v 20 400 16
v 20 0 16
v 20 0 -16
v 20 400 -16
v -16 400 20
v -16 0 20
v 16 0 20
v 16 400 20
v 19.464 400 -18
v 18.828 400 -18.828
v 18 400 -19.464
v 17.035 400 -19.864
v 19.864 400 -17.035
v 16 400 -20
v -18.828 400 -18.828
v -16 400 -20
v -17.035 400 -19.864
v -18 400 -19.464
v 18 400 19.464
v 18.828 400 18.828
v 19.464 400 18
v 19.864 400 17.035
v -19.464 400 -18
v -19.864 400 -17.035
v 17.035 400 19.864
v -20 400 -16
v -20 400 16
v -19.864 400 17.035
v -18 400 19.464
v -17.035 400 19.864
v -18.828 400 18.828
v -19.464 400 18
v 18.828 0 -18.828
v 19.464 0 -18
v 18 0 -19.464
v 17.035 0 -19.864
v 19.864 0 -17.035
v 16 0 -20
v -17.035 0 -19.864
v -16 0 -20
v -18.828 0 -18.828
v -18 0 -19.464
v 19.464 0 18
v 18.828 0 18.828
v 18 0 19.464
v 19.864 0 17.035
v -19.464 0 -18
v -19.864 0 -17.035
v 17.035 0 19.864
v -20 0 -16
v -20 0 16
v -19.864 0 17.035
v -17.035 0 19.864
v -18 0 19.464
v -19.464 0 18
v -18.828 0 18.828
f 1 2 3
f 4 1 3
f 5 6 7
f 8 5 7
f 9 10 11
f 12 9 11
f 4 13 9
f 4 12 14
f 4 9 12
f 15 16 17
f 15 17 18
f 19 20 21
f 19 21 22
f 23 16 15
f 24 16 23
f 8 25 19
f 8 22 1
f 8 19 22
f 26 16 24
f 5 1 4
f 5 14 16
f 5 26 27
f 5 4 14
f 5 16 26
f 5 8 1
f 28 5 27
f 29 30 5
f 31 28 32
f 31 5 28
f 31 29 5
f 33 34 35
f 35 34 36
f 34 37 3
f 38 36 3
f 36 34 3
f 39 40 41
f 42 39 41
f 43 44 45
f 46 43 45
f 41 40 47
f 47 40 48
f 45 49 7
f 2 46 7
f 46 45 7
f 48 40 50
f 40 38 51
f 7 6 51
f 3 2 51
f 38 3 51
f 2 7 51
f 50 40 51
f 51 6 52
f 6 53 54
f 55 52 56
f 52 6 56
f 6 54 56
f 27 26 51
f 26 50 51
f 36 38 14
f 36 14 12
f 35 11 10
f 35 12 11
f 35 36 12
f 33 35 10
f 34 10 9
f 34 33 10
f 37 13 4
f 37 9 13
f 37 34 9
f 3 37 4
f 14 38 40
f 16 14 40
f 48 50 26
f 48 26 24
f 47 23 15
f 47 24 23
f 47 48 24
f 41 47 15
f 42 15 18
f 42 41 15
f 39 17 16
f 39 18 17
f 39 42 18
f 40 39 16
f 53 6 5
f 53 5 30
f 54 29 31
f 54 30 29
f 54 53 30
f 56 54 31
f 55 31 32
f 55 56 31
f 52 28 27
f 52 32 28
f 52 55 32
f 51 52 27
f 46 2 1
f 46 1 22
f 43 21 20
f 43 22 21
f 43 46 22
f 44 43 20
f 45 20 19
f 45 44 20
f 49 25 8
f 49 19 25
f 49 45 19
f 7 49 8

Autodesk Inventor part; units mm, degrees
ref_plane "YZ Plane" through (0, 0, 0) normal (1, 0, 0) x (0, 1, 0)
ref_plane "XZ Plane" through (0, 0, 0) normal (0, 1, 0) x (-1, 0, 0)
ref_plane "XY Plane" through (0, 0, 0) normal (0, 0, 1) x (1, 0, 0)
sketch "Sketch1" plane through (0, 0, 0) normal (0, 1, 0) x (-1, 0, 0)
  line L0 (0, 12.4728) -> (0, -12.4728) construction
  line L1 (2.135, 0) -> (-2.135, 0) construction
  line L2 (16, 20) -> (-16, 20)
  line L3 (-20, 16) -> (-20, -16)
  line L4 (-16, -20) -> (16, -20)
  line L5 (20, -16) -> (20, 16)
  arc A0 (-16, 20) -> (-20, 16) centre (-16, 16) ccw
  arc A1 (-20, -16) -> (-16, -20) centre (-16, -16) ccw
  arc A2 (16, -20) -> (20, -16) centre (16, -16) ccw
  arc A3 (20, 16) -> (16, 20) centre (16, 16) ccw
  point P0 (0, 0)
  point P1 (0, 0)
  dimension "d1" = 4
  dimension "d2" = 4
  dimension "d3" = 40
extrude "Extrusion1" add sketch "Sketch1" along normal blind 400
properties part number "item40x40_1000"
